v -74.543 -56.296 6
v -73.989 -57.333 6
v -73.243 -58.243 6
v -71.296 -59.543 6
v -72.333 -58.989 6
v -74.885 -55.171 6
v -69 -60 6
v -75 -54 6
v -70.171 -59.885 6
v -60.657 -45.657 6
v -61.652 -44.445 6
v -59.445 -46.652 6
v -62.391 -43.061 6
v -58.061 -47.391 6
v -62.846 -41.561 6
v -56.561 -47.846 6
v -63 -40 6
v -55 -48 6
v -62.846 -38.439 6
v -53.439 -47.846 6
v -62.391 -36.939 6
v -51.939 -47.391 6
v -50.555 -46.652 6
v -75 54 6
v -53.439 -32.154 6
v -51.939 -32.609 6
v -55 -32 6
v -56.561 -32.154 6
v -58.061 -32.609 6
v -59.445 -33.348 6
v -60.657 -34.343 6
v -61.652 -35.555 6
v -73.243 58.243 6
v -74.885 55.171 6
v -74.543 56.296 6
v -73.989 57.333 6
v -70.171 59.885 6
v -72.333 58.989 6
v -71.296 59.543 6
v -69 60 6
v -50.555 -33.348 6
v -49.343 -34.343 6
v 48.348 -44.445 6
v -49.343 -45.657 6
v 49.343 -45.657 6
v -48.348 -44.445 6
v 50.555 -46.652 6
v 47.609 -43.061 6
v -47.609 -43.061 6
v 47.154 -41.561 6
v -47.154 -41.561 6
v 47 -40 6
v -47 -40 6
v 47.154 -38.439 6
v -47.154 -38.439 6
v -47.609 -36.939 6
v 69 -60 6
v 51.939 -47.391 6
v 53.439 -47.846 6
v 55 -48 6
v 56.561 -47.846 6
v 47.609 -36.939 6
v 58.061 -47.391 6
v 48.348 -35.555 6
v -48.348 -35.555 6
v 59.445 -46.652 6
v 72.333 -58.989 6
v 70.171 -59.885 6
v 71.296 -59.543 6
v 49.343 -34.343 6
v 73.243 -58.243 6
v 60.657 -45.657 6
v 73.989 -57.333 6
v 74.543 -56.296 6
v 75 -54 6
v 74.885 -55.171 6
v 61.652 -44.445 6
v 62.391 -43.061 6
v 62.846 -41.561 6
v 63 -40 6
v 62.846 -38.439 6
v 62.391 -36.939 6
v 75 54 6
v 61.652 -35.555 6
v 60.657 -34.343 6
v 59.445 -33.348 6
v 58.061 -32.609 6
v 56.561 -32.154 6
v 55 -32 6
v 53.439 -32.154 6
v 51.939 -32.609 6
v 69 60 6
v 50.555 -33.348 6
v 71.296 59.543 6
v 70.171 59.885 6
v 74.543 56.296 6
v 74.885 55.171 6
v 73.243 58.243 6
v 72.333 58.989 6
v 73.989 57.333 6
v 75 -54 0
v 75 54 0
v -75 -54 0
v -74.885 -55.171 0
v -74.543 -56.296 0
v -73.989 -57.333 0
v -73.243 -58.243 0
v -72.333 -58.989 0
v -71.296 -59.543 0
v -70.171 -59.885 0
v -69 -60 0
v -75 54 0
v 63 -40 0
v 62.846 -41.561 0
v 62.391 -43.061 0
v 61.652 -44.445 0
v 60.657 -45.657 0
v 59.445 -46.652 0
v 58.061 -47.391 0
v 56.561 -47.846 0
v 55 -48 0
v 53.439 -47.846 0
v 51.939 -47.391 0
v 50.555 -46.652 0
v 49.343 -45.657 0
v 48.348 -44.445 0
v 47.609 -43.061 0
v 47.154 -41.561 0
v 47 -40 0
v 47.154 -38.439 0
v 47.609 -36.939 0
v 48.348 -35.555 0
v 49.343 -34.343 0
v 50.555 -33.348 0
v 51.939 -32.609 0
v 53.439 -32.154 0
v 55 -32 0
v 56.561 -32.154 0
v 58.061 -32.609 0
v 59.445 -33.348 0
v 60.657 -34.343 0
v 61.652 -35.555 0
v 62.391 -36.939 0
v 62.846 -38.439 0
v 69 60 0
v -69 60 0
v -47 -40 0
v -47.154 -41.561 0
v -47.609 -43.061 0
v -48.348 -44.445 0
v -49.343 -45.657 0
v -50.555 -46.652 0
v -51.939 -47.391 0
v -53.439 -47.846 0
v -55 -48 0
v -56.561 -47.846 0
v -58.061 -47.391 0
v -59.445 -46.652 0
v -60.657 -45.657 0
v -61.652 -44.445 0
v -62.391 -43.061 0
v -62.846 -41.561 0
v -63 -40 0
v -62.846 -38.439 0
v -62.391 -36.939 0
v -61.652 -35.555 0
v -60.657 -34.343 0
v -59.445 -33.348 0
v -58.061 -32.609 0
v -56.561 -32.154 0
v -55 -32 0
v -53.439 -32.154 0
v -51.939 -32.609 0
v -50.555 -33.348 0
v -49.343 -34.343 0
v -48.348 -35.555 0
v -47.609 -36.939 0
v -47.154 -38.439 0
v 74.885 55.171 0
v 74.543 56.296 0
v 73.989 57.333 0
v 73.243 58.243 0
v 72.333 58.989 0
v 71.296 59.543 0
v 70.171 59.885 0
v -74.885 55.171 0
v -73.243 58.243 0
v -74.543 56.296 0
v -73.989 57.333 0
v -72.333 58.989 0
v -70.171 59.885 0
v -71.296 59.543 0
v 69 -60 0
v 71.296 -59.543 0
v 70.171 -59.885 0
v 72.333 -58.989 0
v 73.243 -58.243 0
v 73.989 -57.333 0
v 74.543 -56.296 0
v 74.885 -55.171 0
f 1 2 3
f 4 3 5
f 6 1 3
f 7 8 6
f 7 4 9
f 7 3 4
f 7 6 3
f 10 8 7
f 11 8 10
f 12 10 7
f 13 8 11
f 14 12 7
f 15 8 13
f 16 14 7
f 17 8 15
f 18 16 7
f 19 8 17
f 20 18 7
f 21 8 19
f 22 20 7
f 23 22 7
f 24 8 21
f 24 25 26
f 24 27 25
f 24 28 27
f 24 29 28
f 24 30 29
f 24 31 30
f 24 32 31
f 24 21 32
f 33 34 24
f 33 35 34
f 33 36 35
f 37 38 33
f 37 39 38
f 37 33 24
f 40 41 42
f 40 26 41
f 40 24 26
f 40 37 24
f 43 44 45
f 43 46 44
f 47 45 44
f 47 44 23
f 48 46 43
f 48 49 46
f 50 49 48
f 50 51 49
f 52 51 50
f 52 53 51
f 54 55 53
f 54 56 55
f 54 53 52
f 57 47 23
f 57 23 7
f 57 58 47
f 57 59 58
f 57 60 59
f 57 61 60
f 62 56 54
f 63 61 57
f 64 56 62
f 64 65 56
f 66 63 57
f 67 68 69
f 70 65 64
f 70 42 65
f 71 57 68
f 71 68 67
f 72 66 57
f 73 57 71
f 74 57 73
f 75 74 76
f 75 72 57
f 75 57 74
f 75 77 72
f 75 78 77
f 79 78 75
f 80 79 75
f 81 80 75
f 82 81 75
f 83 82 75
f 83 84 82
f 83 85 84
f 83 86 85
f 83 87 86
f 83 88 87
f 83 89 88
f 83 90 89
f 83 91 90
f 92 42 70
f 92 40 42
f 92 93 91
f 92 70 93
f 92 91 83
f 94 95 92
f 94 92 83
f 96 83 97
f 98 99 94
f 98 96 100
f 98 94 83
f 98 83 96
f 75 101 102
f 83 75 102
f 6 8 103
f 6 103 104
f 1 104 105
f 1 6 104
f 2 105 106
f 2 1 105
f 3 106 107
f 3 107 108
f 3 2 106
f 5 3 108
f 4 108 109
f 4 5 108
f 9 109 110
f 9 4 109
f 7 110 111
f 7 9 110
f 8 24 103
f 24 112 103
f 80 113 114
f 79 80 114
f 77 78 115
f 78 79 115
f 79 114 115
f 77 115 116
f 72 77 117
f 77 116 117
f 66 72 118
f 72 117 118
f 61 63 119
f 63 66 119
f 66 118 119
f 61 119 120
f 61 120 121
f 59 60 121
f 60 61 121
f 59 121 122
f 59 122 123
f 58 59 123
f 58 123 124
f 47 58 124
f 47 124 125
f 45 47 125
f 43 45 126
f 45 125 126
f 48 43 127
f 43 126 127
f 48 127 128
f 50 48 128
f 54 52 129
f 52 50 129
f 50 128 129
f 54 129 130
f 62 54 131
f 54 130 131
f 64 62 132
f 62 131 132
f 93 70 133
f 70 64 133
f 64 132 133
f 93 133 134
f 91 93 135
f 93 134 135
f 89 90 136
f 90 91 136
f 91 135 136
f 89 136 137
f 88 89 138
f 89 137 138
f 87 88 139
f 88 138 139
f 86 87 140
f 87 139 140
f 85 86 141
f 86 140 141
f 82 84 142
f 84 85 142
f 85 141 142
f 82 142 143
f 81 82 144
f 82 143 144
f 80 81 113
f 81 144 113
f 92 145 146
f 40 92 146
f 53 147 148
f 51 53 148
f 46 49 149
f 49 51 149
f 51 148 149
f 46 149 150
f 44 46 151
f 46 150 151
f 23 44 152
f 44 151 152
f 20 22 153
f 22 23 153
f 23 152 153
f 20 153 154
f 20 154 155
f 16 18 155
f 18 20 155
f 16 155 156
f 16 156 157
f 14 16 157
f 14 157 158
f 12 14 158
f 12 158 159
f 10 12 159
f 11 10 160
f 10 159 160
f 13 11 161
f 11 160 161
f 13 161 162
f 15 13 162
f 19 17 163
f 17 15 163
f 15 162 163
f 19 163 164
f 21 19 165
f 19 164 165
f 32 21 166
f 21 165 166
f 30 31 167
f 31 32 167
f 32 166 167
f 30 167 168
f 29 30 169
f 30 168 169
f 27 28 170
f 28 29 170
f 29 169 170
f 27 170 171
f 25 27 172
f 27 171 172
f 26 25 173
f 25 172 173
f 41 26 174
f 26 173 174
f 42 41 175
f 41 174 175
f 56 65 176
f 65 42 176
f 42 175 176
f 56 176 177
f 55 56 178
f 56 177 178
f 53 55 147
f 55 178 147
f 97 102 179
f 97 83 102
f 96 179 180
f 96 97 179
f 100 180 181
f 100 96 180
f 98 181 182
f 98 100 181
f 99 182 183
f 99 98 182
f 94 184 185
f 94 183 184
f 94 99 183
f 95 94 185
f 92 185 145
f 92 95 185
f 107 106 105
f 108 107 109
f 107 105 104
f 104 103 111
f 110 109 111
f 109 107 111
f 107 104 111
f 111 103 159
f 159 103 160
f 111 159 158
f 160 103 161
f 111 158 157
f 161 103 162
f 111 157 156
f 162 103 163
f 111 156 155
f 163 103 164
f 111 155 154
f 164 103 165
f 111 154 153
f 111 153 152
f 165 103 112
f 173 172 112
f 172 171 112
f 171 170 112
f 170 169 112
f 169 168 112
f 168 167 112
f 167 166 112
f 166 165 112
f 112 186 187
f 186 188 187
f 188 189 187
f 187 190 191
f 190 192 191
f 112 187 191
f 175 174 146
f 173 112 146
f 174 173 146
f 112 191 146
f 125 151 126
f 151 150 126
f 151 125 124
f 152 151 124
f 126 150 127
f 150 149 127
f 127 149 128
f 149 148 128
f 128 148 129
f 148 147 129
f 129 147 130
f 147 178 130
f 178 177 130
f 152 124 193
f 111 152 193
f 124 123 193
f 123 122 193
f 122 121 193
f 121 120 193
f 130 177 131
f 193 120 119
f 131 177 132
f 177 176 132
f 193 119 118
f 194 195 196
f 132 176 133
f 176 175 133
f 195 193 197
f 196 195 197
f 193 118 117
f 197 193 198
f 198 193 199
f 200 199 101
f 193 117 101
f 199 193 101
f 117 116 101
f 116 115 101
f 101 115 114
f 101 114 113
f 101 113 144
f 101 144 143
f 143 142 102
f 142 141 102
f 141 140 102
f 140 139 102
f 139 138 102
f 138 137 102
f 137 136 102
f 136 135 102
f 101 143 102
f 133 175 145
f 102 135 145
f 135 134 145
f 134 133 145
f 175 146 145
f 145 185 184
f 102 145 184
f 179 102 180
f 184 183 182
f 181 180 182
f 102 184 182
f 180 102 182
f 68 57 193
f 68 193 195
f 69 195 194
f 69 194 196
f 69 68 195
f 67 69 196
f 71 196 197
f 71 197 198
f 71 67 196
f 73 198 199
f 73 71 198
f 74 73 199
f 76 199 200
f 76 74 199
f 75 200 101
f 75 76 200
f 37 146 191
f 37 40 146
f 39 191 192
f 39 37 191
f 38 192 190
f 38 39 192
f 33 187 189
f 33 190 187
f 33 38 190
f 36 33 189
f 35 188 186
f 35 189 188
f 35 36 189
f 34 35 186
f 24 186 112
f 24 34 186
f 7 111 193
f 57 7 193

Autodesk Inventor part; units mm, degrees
ref_plane "YZ Plane" through (0, 0, 0) normal (1, 0, 0) x (0, 1, 0)
ref_plane "XZ Plane" through (0, 0, 0) normal (0, 1, 0) x (-1, 0, 0)
ref_plane "XY Plane" through (0, 0, 0) normal (0, 0, 1) x (1, 0, 0)
sketch "Sketch1" plane through (0, 0, 0) normal (0, 0, 1) x (1, 0, 0)
  line L0 (-75, -60) -> (75, -60)
  line L1 (75, -60) -> (75, 60)
  line L2 (75, 60) -> (-75, 60)
  line L3 (-75, 60) -> (-75, -60)
  line L4 (-75, -60) -> (75, 60) construction
  line L5 (75, -60) -> (-75, 60) construction
  circle A0 centre (-55, 40) radius 8
  circle A1 centre (-55, -40) radius 8
  circle A2 centre (55, 40) radius 8
  circle A3 centre (55, -40) radius 8
  line L6 (0, 60) -> (0, -60) construction
  line L7 (-75, 0) -> (75, 0) construction
  point P0 (0, 0)
  dimension "d154" = 150
  dimension "d155" = 120
  dimension "d157" = 20
  dimension "d158" = 20
  dimension "d159" = 16
extrude "Plate5" add sketch "Sketch1" along normal blind 6 contours L3 L2 L1 L0 | A0 | A2
fillet "Corner Round1" radius 6 4 edges at (-75, -60, 3) (75, -60, 3) (75, 60, 3) (-75, 60, 3)
properties part number "NDM-VOS pillar 2 plate 1" material "Steel"
